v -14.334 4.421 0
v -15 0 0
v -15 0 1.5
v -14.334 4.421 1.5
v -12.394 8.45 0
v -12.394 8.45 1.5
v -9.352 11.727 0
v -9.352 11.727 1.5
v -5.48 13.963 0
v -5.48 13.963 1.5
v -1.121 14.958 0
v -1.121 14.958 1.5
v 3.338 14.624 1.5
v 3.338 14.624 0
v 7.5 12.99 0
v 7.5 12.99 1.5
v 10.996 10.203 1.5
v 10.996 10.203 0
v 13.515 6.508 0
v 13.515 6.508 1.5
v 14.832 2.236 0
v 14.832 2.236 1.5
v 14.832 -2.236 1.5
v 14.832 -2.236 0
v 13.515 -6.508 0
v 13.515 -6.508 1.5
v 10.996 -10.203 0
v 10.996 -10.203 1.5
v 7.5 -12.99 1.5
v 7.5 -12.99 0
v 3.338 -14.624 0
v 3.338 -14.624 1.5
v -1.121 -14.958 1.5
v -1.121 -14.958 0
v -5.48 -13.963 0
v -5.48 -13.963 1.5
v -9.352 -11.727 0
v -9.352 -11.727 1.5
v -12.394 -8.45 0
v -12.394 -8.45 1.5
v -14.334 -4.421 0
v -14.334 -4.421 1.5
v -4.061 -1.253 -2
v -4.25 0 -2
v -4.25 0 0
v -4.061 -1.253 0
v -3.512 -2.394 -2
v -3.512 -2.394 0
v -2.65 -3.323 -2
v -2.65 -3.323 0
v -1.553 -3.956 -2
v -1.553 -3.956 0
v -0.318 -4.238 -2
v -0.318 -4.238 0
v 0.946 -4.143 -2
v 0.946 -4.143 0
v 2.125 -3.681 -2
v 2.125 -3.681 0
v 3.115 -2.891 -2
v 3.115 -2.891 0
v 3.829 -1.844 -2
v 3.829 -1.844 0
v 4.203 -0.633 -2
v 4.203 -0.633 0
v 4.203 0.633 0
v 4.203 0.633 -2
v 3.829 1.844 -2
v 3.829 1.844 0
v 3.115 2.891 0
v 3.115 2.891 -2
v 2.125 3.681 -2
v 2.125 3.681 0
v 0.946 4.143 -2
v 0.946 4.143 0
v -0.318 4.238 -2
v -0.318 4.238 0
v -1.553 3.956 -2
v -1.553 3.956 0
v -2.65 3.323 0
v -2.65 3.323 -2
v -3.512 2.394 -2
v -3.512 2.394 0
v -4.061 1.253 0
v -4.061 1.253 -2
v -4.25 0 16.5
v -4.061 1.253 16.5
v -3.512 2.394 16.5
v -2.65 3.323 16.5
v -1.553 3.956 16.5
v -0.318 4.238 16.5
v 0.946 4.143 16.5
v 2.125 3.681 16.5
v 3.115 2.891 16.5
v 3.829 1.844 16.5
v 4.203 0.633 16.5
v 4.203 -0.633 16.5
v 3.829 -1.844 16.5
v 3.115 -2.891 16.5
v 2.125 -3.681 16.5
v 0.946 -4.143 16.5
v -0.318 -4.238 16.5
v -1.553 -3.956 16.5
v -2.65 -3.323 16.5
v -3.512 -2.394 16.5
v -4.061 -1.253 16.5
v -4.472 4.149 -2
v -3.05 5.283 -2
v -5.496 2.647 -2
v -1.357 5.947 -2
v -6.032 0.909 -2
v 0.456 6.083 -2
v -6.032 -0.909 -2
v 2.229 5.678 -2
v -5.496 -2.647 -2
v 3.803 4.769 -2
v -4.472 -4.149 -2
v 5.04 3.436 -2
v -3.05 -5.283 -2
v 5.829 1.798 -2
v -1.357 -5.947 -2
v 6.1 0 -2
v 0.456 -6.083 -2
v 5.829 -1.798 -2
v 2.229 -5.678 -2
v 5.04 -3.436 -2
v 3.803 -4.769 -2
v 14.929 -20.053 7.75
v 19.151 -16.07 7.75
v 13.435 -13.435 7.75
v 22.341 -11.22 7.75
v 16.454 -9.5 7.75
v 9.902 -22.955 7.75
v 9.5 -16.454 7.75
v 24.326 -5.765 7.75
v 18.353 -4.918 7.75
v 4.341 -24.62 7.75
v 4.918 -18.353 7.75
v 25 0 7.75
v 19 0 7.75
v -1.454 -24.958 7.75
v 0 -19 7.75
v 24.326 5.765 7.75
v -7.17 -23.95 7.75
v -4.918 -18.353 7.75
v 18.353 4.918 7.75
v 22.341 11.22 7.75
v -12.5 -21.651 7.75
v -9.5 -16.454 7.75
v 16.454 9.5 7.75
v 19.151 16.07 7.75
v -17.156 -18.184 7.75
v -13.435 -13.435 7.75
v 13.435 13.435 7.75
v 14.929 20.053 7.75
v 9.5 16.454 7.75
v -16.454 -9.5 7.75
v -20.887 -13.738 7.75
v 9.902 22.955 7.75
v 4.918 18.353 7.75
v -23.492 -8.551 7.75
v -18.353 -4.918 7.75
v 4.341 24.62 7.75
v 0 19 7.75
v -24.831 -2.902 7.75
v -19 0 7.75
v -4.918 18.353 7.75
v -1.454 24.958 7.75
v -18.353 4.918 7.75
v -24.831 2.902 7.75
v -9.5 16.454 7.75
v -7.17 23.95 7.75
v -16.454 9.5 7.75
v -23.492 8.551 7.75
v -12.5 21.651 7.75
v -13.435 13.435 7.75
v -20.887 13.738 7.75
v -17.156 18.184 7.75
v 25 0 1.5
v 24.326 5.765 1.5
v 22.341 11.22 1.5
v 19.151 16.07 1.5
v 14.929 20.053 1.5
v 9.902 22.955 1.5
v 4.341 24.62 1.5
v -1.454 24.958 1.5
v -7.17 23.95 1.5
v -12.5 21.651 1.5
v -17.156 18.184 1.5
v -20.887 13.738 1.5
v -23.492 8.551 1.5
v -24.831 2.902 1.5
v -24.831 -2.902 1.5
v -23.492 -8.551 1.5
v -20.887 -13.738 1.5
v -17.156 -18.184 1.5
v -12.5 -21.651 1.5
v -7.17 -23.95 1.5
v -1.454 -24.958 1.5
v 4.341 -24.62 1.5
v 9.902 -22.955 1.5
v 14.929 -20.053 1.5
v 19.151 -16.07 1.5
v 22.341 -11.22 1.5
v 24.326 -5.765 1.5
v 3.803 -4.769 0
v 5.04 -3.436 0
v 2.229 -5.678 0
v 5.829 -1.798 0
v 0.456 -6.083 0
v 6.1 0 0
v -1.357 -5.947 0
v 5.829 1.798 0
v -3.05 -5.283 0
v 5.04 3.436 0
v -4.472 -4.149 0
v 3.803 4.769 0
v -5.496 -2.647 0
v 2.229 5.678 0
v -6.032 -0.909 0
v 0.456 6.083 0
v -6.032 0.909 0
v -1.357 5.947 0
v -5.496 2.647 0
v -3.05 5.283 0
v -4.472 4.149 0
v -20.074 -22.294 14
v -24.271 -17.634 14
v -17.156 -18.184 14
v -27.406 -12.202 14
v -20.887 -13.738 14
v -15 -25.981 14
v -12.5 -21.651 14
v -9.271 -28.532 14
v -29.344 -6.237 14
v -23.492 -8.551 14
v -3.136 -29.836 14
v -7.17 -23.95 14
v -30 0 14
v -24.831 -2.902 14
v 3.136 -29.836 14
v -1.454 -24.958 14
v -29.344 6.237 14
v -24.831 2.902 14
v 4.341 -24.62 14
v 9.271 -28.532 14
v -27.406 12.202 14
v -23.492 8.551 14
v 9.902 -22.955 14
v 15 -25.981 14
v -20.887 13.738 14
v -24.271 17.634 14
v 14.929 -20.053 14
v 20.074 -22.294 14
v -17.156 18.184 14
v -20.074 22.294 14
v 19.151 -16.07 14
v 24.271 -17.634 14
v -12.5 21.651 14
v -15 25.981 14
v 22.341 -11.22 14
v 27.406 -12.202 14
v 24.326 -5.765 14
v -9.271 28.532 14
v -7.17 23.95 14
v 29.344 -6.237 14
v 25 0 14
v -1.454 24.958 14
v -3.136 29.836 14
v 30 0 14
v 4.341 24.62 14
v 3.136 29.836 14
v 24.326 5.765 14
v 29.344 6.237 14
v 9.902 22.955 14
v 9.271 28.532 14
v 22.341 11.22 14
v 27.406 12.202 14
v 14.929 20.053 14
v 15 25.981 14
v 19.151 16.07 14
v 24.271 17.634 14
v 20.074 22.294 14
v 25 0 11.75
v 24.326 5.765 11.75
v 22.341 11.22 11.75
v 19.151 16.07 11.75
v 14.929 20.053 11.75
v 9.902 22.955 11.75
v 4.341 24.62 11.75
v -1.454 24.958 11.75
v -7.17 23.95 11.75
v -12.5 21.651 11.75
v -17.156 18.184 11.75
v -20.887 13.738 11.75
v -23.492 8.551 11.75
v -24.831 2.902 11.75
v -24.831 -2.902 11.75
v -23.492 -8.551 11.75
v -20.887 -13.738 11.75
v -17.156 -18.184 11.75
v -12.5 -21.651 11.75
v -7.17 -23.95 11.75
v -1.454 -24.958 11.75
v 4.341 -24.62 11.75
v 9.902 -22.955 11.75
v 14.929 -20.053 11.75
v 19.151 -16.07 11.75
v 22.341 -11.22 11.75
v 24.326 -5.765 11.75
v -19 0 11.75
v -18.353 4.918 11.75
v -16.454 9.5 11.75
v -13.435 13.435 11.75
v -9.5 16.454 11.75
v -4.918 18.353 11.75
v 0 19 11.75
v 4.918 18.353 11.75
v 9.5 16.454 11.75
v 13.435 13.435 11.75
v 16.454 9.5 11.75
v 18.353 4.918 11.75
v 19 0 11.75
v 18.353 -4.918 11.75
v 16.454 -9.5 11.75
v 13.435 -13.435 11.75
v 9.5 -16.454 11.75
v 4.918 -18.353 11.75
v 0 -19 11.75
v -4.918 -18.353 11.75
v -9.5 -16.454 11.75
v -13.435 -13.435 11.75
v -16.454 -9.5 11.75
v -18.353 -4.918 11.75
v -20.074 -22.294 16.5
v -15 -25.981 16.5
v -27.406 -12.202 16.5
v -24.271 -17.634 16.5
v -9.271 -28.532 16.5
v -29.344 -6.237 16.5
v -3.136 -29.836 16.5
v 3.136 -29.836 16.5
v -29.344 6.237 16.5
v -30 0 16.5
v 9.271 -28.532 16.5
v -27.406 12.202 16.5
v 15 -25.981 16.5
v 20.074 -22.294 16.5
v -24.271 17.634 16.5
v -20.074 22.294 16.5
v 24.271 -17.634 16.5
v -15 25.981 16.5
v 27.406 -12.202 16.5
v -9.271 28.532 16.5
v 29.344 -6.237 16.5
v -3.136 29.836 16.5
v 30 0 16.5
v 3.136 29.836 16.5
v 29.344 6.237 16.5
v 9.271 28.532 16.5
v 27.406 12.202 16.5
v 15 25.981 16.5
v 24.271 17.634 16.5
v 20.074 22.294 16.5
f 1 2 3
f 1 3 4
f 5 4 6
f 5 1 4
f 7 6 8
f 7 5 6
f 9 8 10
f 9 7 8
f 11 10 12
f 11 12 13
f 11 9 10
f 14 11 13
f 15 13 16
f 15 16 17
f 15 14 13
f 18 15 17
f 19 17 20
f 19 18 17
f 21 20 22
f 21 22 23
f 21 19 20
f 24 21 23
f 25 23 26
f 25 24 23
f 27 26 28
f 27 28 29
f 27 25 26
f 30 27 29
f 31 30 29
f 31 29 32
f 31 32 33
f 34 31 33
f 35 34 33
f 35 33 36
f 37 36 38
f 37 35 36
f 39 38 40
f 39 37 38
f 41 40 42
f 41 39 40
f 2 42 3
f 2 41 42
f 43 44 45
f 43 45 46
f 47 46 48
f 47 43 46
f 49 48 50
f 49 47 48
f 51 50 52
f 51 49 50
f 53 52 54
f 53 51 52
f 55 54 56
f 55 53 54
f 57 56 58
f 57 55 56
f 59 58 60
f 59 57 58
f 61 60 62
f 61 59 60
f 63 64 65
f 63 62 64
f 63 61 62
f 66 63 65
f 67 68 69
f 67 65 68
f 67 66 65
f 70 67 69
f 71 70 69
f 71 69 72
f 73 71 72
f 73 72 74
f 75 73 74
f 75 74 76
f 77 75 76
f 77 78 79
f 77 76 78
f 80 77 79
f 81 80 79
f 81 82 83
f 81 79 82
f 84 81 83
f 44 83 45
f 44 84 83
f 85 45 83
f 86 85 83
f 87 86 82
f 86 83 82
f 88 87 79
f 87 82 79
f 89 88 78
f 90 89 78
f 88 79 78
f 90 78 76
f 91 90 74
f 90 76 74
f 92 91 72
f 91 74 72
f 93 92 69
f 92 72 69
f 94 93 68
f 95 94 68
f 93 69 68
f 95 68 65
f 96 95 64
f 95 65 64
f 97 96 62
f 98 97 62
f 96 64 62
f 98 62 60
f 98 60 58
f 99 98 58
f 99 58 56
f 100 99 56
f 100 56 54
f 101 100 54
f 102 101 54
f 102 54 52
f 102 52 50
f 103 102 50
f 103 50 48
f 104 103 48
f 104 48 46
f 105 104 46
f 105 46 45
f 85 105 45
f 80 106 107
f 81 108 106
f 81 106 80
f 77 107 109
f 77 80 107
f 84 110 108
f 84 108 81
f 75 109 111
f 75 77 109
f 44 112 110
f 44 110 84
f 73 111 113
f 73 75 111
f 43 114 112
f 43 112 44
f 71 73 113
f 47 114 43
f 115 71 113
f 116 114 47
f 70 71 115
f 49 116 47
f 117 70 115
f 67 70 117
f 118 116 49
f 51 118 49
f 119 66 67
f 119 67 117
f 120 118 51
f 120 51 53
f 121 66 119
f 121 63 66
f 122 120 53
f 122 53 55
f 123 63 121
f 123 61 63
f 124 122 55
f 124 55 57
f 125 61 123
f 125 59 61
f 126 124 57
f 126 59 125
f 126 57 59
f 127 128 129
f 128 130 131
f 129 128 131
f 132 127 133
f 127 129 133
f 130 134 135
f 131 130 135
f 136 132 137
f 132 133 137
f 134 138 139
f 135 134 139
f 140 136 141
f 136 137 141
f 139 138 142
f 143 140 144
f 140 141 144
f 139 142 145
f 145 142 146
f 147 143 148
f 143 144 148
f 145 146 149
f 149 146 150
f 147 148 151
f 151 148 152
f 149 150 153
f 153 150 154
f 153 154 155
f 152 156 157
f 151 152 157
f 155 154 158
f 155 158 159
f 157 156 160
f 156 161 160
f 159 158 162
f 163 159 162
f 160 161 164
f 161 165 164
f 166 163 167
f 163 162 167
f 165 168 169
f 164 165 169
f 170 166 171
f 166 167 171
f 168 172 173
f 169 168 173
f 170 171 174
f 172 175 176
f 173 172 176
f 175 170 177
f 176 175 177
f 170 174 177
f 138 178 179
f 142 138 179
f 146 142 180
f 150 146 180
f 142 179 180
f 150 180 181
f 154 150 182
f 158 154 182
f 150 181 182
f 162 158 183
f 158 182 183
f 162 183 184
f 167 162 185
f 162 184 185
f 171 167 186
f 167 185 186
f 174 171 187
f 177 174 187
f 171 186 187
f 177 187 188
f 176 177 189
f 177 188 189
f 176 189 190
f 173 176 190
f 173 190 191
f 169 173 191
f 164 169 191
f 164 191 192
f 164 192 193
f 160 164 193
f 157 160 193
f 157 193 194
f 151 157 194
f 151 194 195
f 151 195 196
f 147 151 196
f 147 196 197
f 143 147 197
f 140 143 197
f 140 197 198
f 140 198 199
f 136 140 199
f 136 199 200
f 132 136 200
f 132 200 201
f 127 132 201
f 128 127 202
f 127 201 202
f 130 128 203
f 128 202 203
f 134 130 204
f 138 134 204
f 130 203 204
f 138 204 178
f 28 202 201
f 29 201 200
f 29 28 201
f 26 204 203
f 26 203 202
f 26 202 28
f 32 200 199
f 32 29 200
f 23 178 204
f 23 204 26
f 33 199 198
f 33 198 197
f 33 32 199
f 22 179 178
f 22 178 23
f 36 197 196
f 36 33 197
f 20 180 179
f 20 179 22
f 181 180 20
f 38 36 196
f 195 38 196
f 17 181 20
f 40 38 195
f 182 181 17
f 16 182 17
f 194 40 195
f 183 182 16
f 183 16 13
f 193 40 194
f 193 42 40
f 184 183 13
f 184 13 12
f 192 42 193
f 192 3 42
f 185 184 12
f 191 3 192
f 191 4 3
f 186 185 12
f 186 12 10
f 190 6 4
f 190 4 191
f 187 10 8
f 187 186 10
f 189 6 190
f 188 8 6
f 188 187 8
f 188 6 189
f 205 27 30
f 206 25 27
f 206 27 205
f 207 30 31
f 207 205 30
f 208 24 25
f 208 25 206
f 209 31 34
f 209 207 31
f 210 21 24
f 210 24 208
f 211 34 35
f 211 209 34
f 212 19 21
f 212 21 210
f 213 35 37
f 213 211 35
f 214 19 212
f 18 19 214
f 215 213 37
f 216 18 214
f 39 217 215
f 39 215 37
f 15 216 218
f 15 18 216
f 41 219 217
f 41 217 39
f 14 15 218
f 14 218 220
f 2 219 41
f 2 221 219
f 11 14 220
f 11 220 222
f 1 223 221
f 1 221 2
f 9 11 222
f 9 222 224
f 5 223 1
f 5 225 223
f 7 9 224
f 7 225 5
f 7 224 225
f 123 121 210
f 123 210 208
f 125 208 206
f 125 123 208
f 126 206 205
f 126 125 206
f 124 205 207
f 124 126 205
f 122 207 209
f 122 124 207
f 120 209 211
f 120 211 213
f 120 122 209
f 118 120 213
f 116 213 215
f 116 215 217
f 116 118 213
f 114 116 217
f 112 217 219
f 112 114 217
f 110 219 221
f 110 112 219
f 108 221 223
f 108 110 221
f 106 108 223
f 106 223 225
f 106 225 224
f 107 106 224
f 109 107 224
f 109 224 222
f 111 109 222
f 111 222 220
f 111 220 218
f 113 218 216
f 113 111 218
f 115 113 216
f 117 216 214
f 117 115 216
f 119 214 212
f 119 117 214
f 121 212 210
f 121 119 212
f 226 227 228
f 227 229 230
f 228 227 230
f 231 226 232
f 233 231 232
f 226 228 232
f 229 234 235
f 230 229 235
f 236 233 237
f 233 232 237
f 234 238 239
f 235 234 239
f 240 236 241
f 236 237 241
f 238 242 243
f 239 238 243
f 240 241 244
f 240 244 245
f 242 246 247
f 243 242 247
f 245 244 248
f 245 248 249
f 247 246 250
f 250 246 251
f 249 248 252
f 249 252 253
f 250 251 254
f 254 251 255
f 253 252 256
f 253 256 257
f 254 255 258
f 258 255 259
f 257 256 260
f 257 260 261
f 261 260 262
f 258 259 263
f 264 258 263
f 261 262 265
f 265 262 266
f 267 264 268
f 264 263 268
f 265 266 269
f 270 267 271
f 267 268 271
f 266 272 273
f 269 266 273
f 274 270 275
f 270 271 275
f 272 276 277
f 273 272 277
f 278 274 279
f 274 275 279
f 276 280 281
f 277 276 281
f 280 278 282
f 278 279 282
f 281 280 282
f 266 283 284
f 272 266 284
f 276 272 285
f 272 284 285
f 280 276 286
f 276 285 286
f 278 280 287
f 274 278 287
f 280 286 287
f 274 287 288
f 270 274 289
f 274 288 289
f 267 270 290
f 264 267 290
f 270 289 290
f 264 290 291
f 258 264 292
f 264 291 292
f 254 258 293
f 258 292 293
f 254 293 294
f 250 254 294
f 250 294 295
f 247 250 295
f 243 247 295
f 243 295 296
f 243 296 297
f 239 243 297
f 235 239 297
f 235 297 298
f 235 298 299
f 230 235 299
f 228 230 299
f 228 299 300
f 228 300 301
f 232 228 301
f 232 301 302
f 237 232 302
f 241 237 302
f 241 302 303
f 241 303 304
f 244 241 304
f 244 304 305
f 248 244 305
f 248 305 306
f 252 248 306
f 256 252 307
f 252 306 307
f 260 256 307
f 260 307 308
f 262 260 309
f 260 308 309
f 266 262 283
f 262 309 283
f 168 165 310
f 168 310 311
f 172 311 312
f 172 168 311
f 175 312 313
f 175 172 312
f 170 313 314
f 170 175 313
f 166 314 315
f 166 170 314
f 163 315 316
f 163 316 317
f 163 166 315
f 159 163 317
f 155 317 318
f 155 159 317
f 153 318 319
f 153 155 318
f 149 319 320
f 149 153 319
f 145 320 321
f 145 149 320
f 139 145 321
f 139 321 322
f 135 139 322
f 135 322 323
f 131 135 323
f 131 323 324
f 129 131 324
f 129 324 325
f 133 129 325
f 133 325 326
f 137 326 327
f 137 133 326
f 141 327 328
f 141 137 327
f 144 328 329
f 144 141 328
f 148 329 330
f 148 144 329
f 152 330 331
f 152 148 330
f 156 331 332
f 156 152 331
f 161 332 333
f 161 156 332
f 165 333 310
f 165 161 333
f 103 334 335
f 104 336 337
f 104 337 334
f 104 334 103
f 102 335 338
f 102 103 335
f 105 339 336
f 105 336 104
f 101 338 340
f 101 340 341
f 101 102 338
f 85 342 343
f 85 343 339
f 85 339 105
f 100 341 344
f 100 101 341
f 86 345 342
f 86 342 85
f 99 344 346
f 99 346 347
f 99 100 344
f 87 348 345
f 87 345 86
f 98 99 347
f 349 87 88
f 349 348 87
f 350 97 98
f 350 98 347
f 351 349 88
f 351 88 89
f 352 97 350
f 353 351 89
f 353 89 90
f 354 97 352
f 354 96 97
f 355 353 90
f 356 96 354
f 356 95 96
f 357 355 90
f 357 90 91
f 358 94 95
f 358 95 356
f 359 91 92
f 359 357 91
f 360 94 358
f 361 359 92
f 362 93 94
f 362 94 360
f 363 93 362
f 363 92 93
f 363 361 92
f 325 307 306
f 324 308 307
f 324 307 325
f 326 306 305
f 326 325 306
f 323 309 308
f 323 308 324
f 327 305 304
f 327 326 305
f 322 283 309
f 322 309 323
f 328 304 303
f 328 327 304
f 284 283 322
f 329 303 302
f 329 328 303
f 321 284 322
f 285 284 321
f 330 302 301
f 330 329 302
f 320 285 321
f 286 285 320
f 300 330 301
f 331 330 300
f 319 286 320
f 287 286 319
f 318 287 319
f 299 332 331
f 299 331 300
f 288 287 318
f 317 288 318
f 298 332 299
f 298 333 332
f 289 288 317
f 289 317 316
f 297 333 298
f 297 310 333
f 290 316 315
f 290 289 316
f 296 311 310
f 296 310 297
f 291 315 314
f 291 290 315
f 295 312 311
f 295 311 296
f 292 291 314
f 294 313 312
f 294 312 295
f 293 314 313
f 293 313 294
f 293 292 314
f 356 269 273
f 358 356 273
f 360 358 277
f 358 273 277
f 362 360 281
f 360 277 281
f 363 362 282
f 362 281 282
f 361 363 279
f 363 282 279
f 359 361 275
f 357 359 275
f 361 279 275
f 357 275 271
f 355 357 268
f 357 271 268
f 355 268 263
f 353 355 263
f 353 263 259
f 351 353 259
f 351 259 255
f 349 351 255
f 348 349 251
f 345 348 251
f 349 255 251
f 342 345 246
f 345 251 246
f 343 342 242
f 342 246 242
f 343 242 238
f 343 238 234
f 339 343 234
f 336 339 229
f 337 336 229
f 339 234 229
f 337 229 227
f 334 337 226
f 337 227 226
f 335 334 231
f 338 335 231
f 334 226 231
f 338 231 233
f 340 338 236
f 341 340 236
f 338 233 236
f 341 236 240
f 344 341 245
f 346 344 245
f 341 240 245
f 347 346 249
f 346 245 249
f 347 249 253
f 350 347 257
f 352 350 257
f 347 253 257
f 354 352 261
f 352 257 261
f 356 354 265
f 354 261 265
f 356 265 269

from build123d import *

# Parameters (mm, degrees)
CROQUIS1_R              = 25
CROQUIS1_R_2            = 11
SALIENTE_EXTRUIR1_DEPTH = 16.5
CROQUIS3_R              = 11
CROQUIS3_R_2            = 9.5
SALIENTE_EXTRUIR2_DEPTH = 10.5
SALIENTE_EXTRUIR3_START = -2
CROQUIS4_R              = 11
CROQUIS4_R_2            = 4
SALIENTE_EXTRUIR3_DEPTH = 2
SALIENTE_EXTRUIR4_START = -2.5
CROQUIS5_R              = 30
CROQUIS5_R_2            = 25
SALIENTE_EXTRUIR4_DEPTH = 2.5
CORTAR_EXTRUIR1_START   = 4
CROQUIS6_R              = 25
CROQUIS6_R_2            = 19
CORTAR_EXTRUIR1_DEPTH   = 4
SALIENTE_EXTRUIR5_REACH = 47.522
CROQUIS7_R              = 11
CROQUIS7_R_2            = 4.25
SALIENTE_EXTRUIR6_START = 2
CROQUIS8_R              = 6.1
CROQUIS8_R_2            = 4
SALIENTE_EXTRUIR6_DEPTH = 2
CROQUIS11_R             = 25
CROQUIS11_R_2           = 15
CORTAR_EXTRUIR2_DEPTH   = 1.5
CROQUIS13_R             = 4.25
CORTAR_EXTRUIR5_DEPTH   = 10
CORTAR_EXTRUIR6_START   = -10
CROQUIS14_R             = 4.25
CORTAR_EXTRUIR6_DEPTH   = 10


with BuildPart() as part:
    # Croquis1 → Saliente-Extruir1 (new body)
    with BuildSketch(Plane.XY):
        Circle(CROQUIS1_R)
        Circle(CROQUIS1_R_2, mode=Mode.SUBTRACT)
    extrude(amount=SALIENTE_EXTRUIR1_DEPTH)

    # Croquis3 → Saliente-Extruir2 (add, through all)
    with BuildSketch(Plane(origin=(0, 0, 6), x_dir=(-1, 0, 0), z_dir=(0, 0, -1))):
        Circle(CROQUIS3_R)
        Circle(CROQUIS3_R_2, mode=Mode.SUBTRACT)
    extrude(amount=-SALIENTE_EXTRUIR2_DEPTH)

    # Croquis4 → Saliente-Extruir3 (add)
    with BuildSketch(Plane.XY.offset(16.5).offset(SALIENTE_EXTRUIR3_START)):
        with Locations(Location((0, 0, 0), (0, 0, 180))):
            Circle(CROQUIS4_R)
        Circle(CROQUIS4_R_2, mode=Mode.SUBTRACT)
    extrude(amount=SALIENTE_EXTRUIR3_DEPTH)

    # Croquis5 → Saliente-Extruir4 (add)
    with BuildSketch(Plane.XY.offset(16.5).offset(SALIENTE_EXTRUIR4_START)):
        Circle(CROQUIS5_R)
        Circle(CROQUIS5_R_2, mode=Mode.SUBTRACT)
    extrude(amount=SALIENTE_EXTRUIR4_DEPTH)

    # Croquis6 → Cortar-Extruir1 (cut)
    with BuildSketch(Plane(origin=(0, 0, 11.75), x_dir=(-1, 0, 0), z_dir=(0, 0, -1)).offset(CORTAR_EXTRUIR1_START)):
        Circle(CROQUIS6_R)
        Circle(CROQUIS6_R_2, mode=Mode.SUBTRACT)
    extrude(amount=-CORTAR_EXTRUIR1_DEPTH, mode=Mode.SUBTRACT)

    # Croquis7 → Saliente-Extruir5 (add, up to next)
    with BuildSketch(Plane(origin=(0, 0, 0), x_dir=(-1, 0, 0), z_dir=(0, 0, -1)), mode=Mode.PRIVATE) as saliente_extruir5_sk1:
        Circle(CROQUIS7_R)
        Circle(CROQUIS7_R_2, mode=Mode.SUBTRACT)
    saliente_extruir5_tool1 = extrude(saliente_extruir5_sk1.sketch, amount=-SALIENTE_EXTRUIR5_REACH, mode=Mode.PRIVATE) - part.part
    add(saliente_extruir5_tool1.solids().sort_by_distance((10.688873, 0, 0))[0])

    # Croquis8 → Saliente-Extruir6 (add)
    with BuildSketch(Plane(origin=(0, 0, 0), x_dir=(-1, 0, 0), z_dir=(0, 0, -1)).offset(SALIENTE_EXTRUIR6_START)):
        with Locations(Location((0, 0, 0), (0, 0, 180))):
            Circle(CROQUIS8_R)
        with Locations(Location((0, 0, 0), (0, 0, 180))):
            Circle(CROQUIS8_R_2, mode=Mode.SUBTRACT)
    extrude(amount=-SALIENTE_EXTRUIR6_DEPTH)

    # Croquis11 → Cortar-Extruir2 (cut)
    with BuildSketch(Plane(origin=(0, 0, 0), x_dir=(-1, 0, 0), z_dir=(0, 0, -1))):
        Circle(CROQUIS11_R)
        Circle(CROQUIS11_R_2, mode=Mode.SUBTRACT)
    extrude(amount=-CORTAR_EXTRUIR2_DEPTH, mode=Mode.SUBTRACT)

    # Croquis13 → Cortar-Extruir5 (cut)
    with BuildSketch(Plane(origin=(0, 0, 14.5), x_dir=(-1, 0, 0), z_dir=(0, 0, -1))):
        Circle(CROQUIS13_R)
    extrude(amount=-CORTAR_EXTRUIR5_DEPTH, mode=Mode.SUBTRACT)

    # Croquis14 → Cortar-Extruir6 (cut)
    with BuildSketch(Plane.XY.offset(CORTAR_EXTRUIR6_START)):
        with Locations(Location((0, 0, 0), (0, 0, 180))):
            Circle(CROQUIS14_R)
    extrude(amount=CORTAR_EXTRUIR6_DEPTH, mode=Mode.SUBTRACT)


solid = part.part
